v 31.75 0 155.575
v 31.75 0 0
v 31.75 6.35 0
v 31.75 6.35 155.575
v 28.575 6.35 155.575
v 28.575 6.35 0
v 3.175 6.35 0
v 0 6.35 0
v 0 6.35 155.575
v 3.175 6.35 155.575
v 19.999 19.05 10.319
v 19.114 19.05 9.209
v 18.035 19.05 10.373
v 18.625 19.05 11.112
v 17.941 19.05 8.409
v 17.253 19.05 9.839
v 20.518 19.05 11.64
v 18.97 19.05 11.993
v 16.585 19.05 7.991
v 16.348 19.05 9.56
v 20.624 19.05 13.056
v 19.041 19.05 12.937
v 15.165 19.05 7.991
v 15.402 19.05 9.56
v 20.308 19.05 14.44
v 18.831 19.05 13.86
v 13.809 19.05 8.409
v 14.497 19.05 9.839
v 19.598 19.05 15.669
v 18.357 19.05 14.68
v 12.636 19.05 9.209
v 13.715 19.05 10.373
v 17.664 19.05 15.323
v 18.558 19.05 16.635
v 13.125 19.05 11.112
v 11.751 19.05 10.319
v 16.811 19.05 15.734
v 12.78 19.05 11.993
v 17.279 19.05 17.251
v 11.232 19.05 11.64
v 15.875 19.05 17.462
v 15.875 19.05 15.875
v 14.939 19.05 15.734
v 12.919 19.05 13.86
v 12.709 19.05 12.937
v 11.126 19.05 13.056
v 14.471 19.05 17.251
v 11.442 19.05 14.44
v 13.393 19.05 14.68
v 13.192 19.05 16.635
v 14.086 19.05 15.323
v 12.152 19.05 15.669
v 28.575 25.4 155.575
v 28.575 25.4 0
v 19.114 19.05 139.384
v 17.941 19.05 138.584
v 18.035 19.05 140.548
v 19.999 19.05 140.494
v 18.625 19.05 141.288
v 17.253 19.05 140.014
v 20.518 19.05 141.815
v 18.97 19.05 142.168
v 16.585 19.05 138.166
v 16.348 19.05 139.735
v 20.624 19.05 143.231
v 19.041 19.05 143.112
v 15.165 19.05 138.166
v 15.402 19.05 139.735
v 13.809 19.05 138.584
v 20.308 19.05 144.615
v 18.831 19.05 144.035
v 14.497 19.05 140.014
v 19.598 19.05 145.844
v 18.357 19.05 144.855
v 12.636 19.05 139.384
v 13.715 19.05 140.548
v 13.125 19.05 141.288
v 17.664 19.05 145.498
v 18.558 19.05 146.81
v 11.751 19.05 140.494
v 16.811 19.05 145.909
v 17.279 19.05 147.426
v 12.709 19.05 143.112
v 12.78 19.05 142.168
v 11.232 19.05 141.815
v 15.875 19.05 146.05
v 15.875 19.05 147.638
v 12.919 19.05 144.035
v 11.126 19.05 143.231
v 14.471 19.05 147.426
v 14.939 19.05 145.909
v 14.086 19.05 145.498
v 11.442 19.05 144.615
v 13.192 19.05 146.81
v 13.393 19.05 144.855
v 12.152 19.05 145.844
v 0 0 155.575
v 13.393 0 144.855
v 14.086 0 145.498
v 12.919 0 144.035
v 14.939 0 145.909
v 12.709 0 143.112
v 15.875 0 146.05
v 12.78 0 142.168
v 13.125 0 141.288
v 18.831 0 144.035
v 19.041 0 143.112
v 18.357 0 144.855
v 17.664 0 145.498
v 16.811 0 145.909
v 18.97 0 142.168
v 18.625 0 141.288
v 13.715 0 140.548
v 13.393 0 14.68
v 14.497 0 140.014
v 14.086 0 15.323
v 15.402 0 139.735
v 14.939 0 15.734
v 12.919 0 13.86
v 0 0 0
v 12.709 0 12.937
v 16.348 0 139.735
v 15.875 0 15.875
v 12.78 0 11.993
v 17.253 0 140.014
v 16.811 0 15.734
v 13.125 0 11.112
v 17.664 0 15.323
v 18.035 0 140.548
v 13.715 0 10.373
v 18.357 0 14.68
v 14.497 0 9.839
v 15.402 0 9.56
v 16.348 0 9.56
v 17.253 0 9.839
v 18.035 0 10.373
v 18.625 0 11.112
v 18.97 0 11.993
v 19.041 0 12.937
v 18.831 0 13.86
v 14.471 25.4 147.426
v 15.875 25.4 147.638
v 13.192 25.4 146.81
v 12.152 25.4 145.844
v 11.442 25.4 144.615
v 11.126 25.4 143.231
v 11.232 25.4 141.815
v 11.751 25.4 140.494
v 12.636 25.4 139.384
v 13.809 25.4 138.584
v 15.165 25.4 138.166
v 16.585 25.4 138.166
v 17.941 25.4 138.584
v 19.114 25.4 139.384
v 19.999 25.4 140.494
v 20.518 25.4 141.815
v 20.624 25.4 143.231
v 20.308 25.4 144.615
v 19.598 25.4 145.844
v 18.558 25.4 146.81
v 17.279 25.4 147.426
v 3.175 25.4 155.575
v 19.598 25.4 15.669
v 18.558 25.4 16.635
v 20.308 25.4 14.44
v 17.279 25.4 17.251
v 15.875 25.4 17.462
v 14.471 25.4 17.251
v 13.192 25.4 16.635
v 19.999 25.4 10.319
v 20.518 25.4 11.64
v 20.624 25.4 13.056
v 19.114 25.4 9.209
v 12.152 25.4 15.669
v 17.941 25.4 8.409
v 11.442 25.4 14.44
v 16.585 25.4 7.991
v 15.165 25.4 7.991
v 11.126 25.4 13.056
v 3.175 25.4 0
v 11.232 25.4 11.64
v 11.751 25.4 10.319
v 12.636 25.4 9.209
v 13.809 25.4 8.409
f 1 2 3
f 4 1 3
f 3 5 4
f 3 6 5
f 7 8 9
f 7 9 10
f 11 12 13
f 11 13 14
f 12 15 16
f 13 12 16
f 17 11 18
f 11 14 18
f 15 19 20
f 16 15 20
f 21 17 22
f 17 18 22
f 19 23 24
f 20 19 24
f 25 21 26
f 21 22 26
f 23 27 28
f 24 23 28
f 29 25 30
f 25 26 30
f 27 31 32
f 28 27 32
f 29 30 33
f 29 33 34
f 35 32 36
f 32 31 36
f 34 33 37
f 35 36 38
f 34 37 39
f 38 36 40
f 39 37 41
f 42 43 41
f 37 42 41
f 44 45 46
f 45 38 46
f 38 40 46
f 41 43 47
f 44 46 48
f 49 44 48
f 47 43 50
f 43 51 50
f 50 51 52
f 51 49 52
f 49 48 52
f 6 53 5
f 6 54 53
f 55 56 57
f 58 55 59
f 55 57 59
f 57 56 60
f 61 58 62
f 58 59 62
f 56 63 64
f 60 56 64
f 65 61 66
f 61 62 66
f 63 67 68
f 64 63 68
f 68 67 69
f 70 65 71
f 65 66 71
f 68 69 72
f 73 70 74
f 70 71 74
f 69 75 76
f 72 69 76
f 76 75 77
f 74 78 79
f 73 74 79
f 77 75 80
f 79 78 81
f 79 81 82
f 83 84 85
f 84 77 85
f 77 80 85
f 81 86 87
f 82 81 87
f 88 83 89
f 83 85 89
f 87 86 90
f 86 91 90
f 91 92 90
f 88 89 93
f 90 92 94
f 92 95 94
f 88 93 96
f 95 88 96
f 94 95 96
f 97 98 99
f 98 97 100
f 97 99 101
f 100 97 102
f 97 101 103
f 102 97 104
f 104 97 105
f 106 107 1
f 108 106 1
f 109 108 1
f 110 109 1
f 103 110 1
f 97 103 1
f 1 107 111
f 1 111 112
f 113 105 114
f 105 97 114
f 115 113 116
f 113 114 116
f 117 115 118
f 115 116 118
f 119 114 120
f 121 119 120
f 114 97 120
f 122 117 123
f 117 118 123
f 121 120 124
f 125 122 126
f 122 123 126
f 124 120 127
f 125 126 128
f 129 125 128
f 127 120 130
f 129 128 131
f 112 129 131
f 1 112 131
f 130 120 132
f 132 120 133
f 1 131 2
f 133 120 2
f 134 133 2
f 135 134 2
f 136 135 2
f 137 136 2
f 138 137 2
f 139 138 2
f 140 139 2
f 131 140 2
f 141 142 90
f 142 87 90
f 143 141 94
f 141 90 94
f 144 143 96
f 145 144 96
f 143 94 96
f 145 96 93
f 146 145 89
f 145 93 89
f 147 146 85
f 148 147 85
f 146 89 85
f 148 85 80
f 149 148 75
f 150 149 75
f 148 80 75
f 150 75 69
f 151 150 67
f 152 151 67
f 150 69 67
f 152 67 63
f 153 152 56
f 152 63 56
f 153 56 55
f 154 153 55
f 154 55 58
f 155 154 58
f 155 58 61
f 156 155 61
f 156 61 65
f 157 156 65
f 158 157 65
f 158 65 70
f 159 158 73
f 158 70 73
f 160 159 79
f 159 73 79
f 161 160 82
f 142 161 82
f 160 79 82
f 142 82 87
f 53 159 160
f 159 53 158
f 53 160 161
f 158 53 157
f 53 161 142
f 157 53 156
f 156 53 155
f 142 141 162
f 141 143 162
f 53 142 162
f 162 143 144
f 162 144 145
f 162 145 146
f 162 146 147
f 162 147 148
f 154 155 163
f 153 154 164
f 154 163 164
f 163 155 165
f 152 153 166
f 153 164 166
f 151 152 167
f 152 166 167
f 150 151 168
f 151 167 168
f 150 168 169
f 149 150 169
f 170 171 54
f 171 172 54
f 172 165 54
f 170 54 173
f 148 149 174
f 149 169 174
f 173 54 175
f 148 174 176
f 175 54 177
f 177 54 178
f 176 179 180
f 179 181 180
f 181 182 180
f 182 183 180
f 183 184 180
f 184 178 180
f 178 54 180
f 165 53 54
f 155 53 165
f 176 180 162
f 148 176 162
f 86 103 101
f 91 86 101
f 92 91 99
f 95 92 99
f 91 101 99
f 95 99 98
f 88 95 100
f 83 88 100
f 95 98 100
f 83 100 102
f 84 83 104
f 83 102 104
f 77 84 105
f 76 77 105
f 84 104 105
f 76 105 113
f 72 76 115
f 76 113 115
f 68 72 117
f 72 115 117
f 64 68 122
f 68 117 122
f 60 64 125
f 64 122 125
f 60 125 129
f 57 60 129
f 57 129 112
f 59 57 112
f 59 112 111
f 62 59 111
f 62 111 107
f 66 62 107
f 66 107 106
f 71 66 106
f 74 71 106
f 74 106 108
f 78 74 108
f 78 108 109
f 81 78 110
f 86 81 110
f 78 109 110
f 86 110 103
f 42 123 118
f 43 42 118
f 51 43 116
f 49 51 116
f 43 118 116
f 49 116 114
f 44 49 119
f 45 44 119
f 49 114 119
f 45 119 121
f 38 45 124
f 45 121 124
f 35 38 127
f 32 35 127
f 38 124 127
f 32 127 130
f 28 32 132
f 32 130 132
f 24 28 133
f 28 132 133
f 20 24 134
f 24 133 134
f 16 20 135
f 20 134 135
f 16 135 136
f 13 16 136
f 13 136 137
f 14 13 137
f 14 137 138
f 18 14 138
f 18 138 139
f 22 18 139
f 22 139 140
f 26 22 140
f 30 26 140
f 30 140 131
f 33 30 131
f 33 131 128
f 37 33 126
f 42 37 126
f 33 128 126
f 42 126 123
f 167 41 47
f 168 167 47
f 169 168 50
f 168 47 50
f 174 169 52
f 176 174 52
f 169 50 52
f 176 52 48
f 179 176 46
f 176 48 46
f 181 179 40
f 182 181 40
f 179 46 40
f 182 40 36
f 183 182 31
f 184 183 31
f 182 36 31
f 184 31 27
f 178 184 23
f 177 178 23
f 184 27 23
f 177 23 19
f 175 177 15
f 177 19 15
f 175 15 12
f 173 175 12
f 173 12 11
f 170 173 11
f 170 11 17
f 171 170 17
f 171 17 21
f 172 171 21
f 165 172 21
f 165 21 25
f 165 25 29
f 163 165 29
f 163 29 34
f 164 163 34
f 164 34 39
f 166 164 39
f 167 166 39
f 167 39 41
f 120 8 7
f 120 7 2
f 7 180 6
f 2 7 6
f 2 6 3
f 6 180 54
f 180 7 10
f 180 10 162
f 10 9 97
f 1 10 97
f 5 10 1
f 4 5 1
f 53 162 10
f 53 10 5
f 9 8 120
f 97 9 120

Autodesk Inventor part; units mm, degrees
ref_plane "YZ Plane" through (0, 0, 0) normal (1, 0, 0) x (0, 1, 0)
ref_plane "XZ Plane" through (0, 0, 0) normal (0, 1, 0) x (-1, 0, 0)
ref_plane "XY Plane" through (0, 0, 0) normal (0, 0, 1) x (1, 0, 0)
sketch "Sketch1" plane through (0, 0, 0) normal (0, 0, 1) x (1, 0, 0)
  line L0 (0, 0) -> (31.75, 0)
  line L1 (31.75, 0) -> (31.75, 6.35)
  line L2 (31.75, 25.4) -> (28.575, 25.4) construction
  line L3 (0, 25.4) -> (0, 6.35) construction
  line L4 (0, 6.35) -> (3.175, 6.35)
  line L5 (3.175, 6.35) -> (3.175, 25.4)
  line L6 (28.575, 25.4) -> (28.575, 6.35)
  line L7 (28.575, 6.35) -> (31.75, 6.35)
  line L8 (0, 6.35) -> (0, 0)
  line L9 (3.175, 25.4) -> (0, 25.4) construction
  line L10 (28.575, 25.4) -> (3.175, 25.4)
  line L11 (31.75, 6.35) -> (31.75, 25.4) construction
  dimension "d0" = 31.75
  dimension "d1" = 25.4
  dimension "d2" = 6.35
  dimension "d3" = 3.175
extrude "Extrusion1" add sketch "Sketch1" along normal blind 155.575
sketch "Sketch2" plane through (3.175, 25.4, 0) normal (0, 1, 0) x (1, 0, 0)
  line L0 (0, -155.575) -> (25.4, -155.575) projected
  line L1 (25.4, 0) -> (25.4, -155.575) projected
  line L2 (25.4, 0) -> (0, 0) projected
  line L3 (0, 0) -> (0, -155.575) projected
  point P0 (-3.175, 0)
  point P1 (12.7, -142.875)
  point P2 (12.7, -12.7)
  dimension "d6" = 12.7
  dimension "d7" = 12.7
  dimension "d8" = 12.7
  dimension "d9" = 12.7
hole "Hole1" at (15.875, 25.4, 142.875) at (15.875, 25.4, 12.7) direction (0, -1, 0) diameter 6.35 end through all counterbore diameter 9.525 counterbore depth 6.35
equation "\"d9\" = d6"
properties part number "8 ball plastic slider 2"
